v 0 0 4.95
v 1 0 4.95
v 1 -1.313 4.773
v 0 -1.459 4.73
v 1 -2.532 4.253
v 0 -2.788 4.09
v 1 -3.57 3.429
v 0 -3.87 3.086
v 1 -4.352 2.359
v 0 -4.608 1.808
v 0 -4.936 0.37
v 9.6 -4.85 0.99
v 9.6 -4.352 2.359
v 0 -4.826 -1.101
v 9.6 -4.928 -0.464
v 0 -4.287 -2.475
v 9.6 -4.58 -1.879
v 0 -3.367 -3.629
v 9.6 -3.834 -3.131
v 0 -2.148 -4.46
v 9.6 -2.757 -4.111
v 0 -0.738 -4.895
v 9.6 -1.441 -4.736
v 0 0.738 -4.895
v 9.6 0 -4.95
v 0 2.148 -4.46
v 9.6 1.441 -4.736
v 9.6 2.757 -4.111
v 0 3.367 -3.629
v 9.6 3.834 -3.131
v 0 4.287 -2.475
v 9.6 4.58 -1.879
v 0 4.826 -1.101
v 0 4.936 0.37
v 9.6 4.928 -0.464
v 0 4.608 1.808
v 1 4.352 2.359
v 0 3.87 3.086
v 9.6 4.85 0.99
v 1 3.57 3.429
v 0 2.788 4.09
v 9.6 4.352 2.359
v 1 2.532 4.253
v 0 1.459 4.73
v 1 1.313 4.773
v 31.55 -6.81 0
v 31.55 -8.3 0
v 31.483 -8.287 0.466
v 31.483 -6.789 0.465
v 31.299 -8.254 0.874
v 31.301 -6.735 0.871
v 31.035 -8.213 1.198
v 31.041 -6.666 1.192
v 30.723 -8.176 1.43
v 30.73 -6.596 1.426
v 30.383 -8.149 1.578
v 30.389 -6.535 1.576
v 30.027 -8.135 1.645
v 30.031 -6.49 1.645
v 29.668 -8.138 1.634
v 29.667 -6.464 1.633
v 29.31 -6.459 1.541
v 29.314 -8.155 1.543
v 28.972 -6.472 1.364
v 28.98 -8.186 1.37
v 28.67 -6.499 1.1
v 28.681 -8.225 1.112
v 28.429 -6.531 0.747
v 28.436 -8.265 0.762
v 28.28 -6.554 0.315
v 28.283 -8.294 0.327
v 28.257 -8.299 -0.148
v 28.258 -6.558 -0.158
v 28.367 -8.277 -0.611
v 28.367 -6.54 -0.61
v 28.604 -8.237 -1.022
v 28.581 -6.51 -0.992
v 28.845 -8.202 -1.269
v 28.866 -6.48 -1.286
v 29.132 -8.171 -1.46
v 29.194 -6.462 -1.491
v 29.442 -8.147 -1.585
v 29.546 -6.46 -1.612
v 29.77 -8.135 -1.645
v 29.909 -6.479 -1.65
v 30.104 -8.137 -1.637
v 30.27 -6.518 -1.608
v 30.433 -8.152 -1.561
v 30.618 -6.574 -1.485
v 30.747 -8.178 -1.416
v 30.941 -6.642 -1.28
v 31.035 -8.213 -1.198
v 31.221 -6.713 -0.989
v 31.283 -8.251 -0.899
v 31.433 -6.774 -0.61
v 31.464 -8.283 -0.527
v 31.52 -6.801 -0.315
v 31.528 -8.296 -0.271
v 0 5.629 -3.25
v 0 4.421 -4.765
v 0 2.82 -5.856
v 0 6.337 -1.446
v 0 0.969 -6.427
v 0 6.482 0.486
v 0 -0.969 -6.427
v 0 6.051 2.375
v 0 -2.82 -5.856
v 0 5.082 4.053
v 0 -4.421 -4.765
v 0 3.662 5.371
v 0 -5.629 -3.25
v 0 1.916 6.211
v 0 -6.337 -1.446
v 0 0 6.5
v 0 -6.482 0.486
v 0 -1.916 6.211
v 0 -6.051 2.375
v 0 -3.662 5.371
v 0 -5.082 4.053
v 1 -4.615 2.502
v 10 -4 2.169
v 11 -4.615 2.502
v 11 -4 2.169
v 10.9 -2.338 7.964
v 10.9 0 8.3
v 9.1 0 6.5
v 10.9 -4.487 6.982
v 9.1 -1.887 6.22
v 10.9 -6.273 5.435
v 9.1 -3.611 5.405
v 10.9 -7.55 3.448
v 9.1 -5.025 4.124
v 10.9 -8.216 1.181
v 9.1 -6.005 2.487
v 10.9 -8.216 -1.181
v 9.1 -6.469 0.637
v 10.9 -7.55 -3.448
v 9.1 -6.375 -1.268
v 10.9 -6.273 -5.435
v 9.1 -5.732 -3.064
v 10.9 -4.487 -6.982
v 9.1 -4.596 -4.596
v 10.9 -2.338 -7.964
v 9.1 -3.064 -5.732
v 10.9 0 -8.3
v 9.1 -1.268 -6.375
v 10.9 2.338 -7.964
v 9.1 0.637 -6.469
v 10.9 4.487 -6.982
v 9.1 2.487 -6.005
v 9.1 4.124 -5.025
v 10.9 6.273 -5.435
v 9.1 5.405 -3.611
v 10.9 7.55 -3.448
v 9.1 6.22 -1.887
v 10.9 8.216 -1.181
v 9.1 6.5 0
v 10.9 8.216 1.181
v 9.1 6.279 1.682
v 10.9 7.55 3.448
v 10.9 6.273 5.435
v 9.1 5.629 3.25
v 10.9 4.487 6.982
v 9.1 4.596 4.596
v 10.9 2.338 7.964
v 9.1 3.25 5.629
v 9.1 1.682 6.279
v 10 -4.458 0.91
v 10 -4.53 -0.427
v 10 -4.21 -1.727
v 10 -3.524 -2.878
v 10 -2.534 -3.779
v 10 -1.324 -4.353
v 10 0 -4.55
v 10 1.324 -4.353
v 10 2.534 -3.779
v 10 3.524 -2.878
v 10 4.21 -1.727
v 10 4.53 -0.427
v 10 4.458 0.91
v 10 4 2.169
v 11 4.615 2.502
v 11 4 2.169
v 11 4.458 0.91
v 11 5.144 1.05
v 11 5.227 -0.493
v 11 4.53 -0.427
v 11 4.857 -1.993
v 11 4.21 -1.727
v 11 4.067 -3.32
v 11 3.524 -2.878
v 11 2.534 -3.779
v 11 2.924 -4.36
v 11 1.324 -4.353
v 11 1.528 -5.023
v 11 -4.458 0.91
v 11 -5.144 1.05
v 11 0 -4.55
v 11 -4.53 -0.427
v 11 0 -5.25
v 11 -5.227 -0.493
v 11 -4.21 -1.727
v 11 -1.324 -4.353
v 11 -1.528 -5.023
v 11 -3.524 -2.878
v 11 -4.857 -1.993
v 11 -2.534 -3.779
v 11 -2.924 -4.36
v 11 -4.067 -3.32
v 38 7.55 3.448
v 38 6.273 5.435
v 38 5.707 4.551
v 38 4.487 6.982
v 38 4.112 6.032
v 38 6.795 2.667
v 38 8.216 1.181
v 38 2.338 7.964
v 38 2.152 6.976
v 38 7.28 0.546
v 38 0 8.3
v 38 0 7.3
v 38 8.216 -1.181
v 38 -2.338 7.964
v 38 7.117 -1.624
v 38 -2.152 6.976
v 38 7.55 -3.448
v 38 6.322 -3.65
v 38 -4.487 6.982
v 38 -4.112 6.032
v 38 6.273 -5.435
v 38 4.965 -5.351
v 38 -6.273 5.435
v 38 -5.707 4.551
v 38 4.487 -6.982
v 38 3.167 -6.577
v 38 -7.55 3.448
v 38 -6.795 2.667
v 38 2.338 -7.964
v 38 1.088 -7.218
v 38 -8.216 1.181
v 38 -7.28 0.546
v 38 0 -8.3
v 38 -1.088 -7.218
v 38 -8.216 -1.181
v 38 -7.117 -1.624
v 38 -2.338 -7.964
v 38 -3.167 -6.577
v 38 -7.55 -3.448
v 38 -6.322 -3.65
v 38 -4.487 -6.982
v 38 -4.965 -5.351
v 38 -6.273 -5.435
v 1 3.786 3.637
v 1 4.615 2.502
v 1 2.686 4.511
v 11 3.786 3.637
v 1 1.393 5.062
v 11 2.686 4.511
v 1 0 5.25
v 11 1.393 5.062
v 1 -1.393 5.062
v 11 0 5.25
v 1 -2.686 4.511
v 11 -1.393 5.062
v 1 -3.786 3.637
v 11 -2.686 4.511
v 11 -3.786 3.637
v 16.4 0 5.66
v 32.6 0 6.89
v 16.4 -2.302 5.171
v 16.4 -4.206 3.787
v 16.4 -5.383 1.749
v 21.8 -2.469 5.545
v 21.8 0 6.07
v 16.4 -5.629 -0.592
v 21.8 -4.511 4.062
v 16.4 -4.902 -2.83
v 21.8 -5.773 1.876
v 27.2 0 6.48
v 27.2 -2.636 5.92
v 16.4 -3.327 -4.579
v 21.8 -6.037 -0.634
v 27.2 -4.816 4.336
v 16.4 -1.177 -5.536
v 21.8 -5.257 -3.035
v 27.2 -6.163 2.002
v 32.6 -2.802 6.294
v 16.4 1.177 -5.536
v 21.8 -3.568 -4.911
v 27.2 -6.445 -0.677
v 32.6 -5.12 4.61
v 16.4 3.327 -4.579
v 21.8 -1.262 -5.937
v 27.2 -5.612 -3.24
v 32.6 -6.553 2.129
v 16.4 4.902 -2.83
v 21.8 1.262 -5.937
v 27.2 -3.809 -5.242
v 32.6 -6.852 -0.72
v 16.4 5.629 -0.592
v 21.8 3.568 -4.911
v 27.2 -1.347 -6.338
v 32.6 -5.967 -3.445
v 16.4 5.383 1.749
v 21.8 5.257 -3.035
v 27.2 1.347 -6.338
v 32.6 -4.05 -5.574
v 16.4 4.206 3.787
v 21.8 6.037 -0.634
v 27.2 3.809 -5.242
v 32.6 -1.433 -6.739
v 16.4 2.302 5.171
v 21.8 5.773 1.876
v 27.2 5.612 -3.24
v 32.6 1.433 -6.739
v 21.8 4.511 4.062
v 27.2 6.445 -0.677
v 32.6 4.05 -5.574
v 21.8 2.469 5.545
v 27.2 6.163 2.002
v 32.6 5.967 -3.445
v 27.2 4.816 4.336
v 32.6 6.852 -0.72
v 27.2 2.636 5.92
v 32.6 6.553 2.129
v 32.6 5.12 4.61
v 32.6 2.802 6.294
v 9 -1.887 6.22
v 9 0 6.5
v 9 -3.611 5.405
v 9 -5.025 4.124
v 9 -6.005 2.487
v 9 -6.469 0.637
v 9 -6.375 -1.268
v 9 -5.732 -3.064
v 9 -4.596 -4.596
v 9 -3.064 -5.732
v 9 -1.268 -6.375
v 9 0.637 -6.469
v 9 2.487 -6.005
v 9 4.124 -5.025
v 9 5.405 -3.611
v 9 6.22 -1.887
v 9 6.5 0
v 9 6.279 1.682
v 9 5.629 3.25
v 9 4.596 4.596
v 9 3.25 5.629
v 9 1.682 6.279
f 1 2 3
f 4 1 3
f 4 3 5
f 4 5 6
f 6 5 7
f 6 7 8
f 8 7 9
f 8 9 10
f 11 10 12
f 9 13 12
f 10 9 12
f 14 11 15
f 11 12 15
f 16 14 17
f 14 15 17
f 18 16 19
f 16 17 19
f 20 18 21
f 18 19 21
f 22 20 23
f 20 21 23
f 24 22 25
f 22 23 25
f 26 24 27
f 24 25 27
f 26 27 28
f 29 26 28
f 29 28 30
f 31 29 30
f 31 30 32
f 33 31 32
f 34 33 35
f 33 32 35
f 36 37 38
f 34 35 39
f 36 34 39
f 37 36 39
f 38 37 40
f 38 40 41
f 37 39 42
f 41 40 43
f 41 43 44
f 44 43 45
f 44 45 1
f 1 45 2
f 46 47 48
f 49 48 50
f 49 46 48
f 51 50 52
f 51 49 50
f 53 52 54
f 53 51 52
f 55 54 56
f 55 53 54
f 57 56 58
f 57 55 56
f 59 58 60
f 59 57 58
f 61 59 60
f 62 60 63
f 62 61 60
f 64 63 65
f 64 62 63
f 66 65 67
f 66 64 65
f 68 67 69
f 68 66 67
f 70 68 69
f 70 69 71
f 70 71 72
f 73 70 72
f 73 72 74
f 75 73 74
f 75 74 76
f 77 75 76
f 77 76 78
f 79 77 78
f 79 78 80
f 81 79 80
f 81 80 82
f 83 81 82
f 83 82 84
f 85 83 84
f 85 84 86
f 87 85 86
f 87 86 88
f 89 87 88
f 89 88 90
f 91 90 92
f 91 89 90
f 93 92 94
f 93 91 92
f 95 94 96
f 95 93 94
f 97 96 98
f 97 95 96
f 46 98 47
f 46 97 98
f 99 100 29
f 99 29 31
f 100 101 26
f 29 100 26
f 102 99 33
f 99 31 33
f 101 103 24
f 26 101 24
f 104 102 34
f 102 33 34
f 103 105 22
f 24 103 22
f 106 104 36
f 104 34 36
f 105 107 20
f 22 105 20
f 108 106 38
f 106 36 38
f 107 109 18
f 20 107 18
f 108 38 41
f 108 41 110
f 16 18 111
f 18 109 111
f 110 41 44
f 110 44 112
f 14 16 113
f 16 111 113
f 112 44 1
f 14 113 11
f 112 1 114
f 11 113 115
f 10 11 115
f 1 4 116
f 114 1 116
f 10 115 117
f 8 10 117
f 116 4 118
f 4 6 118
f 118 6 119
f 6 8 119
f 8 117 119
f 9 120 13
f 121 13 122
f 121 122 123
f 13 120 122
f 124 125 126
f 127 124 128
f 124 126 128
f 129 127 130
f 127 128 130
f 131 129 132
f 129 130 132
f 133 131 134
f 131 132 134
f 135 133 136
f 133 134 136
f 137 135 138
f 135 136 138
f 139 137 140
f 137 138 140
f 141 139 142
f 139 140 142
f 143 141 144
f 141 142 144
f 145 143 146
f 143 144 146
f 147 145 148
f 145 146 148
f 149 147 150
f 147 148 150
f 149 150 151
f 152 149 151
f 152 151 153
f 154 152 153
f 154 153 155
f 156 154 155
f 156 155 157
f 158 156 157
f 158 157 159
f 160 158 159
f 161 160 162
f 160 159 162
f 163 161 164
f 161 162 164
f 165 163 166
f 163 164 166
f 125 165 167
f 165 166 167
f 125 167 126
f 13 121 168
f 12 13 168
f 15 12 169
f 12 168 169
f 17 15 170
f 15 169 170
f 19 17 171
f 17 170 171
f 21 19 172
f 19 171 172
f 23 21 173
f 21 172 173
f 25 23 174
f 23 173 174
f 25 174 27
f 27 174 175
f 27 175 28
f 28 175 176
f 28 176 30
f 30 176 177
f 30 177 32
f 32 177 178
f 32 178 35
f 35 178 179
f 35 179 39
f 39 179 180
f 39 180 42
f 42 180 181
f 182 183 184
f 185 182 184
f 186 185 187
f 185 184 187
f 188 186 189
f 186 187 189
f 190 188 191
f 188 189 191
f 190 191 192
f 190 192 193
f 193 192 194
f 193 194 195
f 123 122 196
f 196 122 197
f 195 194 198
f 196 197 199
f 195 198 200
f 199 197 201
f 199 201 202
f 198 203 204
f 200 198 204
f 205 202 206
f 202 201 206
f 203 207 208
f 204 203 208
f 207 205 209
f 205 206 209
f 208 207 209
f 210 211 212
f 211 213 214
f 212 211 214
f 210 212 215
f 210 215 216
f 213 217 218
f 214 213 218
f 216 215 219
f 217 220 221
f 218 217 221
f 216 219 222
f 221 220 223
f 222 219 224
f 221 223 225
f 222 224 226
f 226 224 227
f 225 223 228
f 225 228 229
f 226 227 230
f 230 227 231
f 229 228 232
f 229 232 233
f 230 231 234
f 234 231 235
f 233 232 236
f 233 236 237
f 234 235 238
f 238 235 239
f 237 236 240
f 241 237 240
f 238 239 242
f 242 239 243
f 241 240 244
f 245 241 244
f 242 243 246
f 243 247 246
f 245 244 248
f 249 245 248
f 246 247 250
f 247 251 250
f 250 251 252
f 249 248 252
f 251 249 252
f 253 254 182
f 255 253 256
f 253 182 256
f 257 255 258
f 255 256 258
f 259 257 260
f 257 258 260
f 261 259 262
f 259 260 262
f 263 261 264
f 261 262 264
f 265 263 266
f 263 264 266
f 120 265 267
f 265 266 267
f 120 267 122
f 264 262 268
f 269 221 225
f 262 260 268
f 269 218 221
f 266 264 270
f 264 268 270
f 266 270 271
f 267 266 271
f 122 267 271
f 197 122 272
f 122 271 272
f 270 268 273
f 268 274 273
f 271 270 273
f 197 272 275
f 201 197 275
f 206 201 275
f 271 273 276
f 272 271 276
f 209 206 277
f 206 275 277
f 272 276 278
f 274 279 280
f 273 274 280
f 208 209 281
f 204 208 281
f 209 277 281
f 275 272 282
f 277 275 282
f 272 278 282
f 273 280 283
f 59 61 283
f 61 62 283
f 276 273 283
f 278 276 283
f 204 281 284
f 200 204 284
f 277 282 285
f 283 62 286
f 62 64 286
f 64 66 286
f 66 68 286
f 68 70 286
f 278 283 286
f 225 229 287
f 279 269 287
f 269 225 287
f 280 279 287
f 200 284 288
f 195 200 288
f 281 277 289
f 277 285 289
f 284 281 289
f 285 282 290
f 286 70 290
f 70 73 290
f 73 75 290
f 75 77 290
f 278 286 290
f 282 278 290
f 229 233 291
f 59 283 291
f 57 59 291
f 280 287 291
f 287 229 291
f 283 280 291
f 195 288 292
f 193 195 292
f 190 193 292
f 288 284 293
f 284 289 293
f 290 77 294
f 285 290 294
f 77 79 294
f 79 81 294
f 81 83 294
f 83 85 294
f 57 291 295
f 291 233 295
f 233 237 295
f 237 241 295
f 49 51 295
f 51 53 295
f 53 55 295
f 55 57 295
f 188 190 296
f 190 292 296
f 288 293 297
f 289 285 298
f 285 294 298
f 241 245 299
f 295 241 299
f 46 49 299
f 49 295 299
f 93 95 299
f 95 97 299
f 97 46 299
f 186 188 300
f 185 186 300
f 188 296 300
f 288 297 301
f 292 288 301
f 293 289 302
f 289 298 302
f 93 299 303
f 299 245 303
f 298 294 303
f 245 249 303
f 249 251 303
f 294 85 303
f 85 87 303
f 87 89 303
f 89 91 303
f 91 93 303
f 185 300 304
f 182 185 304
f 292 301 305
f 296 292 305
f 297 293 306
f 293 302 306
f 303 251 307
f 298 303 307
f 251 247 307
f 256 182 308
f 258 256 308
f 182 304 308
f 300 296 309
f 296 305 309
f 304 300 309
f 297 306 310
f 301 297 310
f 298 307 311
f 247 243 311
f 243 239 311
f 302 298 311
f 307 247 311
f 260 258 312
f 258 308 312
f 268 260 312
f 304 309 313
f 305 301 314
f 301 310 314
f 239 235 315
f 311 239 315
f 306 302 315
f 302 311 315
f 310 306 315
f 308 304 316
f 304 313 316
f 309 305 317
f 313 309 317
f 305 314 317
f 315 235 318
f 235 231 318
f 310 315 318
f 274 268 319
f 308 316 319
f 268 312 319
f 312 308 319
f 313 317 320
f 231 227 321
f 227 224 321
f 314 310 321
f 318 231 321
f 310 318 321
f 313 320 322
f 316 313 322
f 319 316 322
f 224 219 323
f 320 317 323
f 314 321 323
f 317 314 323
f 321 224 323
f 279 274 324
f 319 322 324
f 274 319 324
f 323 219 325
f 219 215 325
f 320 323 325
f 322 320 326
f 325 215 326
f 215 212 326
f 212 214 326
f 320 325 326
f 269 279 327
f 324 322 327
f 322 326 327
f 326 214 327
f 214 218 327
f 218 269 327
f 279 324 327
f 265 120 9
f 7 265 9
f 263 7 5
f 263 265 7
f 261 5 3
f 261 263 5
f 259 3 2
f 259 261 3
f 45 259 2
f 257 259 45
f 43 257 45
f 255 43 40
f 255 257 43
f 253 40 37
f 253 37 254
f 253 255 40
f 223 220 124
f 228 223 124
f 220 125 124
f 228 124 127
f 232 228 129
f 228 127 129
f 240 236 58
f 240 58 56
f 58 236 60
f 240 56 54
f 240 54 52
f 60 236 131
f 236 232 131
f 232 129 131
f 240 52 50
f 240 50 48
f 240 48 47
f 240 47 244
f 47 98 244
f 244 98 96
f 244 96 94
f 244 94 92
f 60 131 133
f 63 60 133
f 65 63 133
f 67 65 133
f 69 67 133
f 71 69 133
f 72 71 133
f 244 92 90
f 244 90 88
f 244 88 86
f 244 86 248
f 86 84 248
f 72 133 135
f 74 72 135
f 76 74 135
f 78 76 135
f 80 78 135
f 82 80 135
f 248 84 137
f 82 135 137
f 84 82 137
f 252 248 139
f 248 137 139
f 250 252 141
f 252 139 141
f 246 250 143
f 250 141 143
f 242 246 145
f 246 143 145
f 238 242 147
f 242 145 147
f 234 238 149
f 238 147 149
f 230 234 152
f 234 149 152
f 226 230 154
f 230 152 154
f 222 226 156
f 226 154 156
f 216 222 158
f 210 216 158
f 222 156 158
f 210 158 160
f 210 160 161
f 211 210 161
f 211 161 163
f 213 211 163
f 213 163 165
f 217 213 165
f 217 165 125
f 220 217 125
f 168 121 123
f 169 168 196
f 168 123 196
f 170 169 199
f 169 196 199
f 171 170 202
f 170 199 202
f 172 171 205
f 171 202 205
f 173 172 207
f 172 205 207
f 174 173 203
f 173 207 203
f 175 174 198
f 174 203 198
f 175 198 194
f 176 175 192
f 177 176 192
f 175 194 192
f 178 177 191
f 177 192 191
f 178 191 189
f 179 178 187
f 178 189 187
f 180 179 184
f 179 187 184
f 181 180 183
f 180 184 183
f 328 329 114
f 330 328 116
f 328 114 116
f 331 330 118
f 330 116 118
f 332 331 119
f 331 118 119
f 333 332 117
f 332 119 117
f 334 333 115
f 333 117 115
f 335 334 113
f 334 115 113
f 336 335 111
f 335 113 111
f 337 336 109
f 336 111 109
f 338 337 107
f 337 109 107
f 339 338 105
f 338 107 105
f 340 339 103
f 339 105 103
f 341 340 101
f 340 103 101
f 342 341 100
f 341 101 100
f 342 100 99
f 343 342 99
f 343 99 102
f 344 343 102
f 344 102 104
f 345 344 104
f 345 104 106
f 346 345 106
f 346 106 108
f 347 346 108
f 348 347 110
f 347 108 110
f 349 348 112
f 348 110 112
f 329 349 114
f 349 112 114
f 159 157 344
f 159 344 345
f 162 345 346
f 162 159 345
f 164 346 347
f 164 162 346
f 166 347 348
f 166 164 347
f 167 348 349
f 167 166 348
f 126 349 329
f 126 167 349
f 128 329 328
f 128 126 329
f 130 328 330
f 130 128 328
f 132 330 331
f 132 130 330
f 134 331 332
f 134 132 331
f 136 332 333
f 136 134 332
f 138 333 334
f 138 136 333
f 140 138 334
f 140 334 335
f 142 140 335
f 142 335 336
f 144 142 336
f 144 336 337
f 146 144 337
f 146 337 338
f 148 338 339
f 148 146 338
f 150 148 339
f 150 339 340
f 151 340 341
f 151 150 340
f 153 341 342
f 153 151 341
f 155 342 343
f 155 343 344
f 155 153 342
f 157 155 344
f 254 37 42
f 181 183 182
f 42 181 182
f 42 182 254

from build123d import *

# Parameters (mm, degrees)
F2_S5_R     = 6.5
F2_T6_DEPTH = 13
F4_DEPTH    = 10
F5_R        = 1.65
F6_DEPTH    = 8.301


# Not quite as in the source:
# - a fillet or chamfer that OpenCascade refuses, or shapes differently, is made with other operations: its cross-section is extruded or revolved along the edge and cut away or added


with BuildPart() as f1:
    # F0 (on Front) → F1 (revolve)
    with BuildSketch(Plane.XZ):
        Polygon((0, 6.5), (0, 4.95), (9.6, 4.95), (10, 4.55), (11, 4.55), (11, 5.25), (38, 7.3), (38, 8.3), (9, 8.3), (9, 6.5), align=None)
    revolve(axis=Axis((19, 0, 0), (1, 0, 0)))

    # F2: chamfer of 1.9 on 1 edges, made by hand


with BuildPart() as f2_tool2:
    # F2_s3 → F2_t4 (revolve)
    with BuildSketch(Plane.XZ):
        Polygon((10.9, 8.3), (9, 6.4), (9, 8.3), align=None)
    revolve(axis=Axis((9, 0, 0), (1, 0, 0)))

    # F2_s5 → F2_t6 (cut, symmetric)
    with BuildSketch(Plane.YZ.offset(9.9)):
        Circle(F2_S5_R)
    extrude(amount=F2_T6_DEPTH, both=True, mode=Mode.SUBTRACT)


with BuildPart() as f1_1:
    add(f1.part)

    # F2_t1: cut F2_tool2
    add(f2_tool2.part, mode=Mode.SUBTRACT)

    # F3 (on face) → F4 (cut)
    with BuildSketch(Plane.YZ.offset(11)):
        with BuildLine():
            Line((-4.6153846154, 2.502144051), (-4, 2.1685248442))
            ThreePointArc((-4, 2.1685248442), (0, 4.55), (4, 2.1685248442))
            Line((4, 2.1685248442), (4.6153846154, 2.502144051))
            ThreePointArc((4.6153846154, 2.502144051), (0, 5.25), (-4.6153846154, 2.502144051))
        make_face()
    extrude(amount=-F4_DEPTH, mode=Mode.SUBTRACT)

    # F5 (on Front) → F6 (cut, through all)
    with BuildSketch(Plane.XZ):
        with Locations((29.9, 0)):
            Circle(F5_R)
    extrude(amount=F6_DEPTH, mode=Mode.SUBTRACT)


solid = f1_1.part
